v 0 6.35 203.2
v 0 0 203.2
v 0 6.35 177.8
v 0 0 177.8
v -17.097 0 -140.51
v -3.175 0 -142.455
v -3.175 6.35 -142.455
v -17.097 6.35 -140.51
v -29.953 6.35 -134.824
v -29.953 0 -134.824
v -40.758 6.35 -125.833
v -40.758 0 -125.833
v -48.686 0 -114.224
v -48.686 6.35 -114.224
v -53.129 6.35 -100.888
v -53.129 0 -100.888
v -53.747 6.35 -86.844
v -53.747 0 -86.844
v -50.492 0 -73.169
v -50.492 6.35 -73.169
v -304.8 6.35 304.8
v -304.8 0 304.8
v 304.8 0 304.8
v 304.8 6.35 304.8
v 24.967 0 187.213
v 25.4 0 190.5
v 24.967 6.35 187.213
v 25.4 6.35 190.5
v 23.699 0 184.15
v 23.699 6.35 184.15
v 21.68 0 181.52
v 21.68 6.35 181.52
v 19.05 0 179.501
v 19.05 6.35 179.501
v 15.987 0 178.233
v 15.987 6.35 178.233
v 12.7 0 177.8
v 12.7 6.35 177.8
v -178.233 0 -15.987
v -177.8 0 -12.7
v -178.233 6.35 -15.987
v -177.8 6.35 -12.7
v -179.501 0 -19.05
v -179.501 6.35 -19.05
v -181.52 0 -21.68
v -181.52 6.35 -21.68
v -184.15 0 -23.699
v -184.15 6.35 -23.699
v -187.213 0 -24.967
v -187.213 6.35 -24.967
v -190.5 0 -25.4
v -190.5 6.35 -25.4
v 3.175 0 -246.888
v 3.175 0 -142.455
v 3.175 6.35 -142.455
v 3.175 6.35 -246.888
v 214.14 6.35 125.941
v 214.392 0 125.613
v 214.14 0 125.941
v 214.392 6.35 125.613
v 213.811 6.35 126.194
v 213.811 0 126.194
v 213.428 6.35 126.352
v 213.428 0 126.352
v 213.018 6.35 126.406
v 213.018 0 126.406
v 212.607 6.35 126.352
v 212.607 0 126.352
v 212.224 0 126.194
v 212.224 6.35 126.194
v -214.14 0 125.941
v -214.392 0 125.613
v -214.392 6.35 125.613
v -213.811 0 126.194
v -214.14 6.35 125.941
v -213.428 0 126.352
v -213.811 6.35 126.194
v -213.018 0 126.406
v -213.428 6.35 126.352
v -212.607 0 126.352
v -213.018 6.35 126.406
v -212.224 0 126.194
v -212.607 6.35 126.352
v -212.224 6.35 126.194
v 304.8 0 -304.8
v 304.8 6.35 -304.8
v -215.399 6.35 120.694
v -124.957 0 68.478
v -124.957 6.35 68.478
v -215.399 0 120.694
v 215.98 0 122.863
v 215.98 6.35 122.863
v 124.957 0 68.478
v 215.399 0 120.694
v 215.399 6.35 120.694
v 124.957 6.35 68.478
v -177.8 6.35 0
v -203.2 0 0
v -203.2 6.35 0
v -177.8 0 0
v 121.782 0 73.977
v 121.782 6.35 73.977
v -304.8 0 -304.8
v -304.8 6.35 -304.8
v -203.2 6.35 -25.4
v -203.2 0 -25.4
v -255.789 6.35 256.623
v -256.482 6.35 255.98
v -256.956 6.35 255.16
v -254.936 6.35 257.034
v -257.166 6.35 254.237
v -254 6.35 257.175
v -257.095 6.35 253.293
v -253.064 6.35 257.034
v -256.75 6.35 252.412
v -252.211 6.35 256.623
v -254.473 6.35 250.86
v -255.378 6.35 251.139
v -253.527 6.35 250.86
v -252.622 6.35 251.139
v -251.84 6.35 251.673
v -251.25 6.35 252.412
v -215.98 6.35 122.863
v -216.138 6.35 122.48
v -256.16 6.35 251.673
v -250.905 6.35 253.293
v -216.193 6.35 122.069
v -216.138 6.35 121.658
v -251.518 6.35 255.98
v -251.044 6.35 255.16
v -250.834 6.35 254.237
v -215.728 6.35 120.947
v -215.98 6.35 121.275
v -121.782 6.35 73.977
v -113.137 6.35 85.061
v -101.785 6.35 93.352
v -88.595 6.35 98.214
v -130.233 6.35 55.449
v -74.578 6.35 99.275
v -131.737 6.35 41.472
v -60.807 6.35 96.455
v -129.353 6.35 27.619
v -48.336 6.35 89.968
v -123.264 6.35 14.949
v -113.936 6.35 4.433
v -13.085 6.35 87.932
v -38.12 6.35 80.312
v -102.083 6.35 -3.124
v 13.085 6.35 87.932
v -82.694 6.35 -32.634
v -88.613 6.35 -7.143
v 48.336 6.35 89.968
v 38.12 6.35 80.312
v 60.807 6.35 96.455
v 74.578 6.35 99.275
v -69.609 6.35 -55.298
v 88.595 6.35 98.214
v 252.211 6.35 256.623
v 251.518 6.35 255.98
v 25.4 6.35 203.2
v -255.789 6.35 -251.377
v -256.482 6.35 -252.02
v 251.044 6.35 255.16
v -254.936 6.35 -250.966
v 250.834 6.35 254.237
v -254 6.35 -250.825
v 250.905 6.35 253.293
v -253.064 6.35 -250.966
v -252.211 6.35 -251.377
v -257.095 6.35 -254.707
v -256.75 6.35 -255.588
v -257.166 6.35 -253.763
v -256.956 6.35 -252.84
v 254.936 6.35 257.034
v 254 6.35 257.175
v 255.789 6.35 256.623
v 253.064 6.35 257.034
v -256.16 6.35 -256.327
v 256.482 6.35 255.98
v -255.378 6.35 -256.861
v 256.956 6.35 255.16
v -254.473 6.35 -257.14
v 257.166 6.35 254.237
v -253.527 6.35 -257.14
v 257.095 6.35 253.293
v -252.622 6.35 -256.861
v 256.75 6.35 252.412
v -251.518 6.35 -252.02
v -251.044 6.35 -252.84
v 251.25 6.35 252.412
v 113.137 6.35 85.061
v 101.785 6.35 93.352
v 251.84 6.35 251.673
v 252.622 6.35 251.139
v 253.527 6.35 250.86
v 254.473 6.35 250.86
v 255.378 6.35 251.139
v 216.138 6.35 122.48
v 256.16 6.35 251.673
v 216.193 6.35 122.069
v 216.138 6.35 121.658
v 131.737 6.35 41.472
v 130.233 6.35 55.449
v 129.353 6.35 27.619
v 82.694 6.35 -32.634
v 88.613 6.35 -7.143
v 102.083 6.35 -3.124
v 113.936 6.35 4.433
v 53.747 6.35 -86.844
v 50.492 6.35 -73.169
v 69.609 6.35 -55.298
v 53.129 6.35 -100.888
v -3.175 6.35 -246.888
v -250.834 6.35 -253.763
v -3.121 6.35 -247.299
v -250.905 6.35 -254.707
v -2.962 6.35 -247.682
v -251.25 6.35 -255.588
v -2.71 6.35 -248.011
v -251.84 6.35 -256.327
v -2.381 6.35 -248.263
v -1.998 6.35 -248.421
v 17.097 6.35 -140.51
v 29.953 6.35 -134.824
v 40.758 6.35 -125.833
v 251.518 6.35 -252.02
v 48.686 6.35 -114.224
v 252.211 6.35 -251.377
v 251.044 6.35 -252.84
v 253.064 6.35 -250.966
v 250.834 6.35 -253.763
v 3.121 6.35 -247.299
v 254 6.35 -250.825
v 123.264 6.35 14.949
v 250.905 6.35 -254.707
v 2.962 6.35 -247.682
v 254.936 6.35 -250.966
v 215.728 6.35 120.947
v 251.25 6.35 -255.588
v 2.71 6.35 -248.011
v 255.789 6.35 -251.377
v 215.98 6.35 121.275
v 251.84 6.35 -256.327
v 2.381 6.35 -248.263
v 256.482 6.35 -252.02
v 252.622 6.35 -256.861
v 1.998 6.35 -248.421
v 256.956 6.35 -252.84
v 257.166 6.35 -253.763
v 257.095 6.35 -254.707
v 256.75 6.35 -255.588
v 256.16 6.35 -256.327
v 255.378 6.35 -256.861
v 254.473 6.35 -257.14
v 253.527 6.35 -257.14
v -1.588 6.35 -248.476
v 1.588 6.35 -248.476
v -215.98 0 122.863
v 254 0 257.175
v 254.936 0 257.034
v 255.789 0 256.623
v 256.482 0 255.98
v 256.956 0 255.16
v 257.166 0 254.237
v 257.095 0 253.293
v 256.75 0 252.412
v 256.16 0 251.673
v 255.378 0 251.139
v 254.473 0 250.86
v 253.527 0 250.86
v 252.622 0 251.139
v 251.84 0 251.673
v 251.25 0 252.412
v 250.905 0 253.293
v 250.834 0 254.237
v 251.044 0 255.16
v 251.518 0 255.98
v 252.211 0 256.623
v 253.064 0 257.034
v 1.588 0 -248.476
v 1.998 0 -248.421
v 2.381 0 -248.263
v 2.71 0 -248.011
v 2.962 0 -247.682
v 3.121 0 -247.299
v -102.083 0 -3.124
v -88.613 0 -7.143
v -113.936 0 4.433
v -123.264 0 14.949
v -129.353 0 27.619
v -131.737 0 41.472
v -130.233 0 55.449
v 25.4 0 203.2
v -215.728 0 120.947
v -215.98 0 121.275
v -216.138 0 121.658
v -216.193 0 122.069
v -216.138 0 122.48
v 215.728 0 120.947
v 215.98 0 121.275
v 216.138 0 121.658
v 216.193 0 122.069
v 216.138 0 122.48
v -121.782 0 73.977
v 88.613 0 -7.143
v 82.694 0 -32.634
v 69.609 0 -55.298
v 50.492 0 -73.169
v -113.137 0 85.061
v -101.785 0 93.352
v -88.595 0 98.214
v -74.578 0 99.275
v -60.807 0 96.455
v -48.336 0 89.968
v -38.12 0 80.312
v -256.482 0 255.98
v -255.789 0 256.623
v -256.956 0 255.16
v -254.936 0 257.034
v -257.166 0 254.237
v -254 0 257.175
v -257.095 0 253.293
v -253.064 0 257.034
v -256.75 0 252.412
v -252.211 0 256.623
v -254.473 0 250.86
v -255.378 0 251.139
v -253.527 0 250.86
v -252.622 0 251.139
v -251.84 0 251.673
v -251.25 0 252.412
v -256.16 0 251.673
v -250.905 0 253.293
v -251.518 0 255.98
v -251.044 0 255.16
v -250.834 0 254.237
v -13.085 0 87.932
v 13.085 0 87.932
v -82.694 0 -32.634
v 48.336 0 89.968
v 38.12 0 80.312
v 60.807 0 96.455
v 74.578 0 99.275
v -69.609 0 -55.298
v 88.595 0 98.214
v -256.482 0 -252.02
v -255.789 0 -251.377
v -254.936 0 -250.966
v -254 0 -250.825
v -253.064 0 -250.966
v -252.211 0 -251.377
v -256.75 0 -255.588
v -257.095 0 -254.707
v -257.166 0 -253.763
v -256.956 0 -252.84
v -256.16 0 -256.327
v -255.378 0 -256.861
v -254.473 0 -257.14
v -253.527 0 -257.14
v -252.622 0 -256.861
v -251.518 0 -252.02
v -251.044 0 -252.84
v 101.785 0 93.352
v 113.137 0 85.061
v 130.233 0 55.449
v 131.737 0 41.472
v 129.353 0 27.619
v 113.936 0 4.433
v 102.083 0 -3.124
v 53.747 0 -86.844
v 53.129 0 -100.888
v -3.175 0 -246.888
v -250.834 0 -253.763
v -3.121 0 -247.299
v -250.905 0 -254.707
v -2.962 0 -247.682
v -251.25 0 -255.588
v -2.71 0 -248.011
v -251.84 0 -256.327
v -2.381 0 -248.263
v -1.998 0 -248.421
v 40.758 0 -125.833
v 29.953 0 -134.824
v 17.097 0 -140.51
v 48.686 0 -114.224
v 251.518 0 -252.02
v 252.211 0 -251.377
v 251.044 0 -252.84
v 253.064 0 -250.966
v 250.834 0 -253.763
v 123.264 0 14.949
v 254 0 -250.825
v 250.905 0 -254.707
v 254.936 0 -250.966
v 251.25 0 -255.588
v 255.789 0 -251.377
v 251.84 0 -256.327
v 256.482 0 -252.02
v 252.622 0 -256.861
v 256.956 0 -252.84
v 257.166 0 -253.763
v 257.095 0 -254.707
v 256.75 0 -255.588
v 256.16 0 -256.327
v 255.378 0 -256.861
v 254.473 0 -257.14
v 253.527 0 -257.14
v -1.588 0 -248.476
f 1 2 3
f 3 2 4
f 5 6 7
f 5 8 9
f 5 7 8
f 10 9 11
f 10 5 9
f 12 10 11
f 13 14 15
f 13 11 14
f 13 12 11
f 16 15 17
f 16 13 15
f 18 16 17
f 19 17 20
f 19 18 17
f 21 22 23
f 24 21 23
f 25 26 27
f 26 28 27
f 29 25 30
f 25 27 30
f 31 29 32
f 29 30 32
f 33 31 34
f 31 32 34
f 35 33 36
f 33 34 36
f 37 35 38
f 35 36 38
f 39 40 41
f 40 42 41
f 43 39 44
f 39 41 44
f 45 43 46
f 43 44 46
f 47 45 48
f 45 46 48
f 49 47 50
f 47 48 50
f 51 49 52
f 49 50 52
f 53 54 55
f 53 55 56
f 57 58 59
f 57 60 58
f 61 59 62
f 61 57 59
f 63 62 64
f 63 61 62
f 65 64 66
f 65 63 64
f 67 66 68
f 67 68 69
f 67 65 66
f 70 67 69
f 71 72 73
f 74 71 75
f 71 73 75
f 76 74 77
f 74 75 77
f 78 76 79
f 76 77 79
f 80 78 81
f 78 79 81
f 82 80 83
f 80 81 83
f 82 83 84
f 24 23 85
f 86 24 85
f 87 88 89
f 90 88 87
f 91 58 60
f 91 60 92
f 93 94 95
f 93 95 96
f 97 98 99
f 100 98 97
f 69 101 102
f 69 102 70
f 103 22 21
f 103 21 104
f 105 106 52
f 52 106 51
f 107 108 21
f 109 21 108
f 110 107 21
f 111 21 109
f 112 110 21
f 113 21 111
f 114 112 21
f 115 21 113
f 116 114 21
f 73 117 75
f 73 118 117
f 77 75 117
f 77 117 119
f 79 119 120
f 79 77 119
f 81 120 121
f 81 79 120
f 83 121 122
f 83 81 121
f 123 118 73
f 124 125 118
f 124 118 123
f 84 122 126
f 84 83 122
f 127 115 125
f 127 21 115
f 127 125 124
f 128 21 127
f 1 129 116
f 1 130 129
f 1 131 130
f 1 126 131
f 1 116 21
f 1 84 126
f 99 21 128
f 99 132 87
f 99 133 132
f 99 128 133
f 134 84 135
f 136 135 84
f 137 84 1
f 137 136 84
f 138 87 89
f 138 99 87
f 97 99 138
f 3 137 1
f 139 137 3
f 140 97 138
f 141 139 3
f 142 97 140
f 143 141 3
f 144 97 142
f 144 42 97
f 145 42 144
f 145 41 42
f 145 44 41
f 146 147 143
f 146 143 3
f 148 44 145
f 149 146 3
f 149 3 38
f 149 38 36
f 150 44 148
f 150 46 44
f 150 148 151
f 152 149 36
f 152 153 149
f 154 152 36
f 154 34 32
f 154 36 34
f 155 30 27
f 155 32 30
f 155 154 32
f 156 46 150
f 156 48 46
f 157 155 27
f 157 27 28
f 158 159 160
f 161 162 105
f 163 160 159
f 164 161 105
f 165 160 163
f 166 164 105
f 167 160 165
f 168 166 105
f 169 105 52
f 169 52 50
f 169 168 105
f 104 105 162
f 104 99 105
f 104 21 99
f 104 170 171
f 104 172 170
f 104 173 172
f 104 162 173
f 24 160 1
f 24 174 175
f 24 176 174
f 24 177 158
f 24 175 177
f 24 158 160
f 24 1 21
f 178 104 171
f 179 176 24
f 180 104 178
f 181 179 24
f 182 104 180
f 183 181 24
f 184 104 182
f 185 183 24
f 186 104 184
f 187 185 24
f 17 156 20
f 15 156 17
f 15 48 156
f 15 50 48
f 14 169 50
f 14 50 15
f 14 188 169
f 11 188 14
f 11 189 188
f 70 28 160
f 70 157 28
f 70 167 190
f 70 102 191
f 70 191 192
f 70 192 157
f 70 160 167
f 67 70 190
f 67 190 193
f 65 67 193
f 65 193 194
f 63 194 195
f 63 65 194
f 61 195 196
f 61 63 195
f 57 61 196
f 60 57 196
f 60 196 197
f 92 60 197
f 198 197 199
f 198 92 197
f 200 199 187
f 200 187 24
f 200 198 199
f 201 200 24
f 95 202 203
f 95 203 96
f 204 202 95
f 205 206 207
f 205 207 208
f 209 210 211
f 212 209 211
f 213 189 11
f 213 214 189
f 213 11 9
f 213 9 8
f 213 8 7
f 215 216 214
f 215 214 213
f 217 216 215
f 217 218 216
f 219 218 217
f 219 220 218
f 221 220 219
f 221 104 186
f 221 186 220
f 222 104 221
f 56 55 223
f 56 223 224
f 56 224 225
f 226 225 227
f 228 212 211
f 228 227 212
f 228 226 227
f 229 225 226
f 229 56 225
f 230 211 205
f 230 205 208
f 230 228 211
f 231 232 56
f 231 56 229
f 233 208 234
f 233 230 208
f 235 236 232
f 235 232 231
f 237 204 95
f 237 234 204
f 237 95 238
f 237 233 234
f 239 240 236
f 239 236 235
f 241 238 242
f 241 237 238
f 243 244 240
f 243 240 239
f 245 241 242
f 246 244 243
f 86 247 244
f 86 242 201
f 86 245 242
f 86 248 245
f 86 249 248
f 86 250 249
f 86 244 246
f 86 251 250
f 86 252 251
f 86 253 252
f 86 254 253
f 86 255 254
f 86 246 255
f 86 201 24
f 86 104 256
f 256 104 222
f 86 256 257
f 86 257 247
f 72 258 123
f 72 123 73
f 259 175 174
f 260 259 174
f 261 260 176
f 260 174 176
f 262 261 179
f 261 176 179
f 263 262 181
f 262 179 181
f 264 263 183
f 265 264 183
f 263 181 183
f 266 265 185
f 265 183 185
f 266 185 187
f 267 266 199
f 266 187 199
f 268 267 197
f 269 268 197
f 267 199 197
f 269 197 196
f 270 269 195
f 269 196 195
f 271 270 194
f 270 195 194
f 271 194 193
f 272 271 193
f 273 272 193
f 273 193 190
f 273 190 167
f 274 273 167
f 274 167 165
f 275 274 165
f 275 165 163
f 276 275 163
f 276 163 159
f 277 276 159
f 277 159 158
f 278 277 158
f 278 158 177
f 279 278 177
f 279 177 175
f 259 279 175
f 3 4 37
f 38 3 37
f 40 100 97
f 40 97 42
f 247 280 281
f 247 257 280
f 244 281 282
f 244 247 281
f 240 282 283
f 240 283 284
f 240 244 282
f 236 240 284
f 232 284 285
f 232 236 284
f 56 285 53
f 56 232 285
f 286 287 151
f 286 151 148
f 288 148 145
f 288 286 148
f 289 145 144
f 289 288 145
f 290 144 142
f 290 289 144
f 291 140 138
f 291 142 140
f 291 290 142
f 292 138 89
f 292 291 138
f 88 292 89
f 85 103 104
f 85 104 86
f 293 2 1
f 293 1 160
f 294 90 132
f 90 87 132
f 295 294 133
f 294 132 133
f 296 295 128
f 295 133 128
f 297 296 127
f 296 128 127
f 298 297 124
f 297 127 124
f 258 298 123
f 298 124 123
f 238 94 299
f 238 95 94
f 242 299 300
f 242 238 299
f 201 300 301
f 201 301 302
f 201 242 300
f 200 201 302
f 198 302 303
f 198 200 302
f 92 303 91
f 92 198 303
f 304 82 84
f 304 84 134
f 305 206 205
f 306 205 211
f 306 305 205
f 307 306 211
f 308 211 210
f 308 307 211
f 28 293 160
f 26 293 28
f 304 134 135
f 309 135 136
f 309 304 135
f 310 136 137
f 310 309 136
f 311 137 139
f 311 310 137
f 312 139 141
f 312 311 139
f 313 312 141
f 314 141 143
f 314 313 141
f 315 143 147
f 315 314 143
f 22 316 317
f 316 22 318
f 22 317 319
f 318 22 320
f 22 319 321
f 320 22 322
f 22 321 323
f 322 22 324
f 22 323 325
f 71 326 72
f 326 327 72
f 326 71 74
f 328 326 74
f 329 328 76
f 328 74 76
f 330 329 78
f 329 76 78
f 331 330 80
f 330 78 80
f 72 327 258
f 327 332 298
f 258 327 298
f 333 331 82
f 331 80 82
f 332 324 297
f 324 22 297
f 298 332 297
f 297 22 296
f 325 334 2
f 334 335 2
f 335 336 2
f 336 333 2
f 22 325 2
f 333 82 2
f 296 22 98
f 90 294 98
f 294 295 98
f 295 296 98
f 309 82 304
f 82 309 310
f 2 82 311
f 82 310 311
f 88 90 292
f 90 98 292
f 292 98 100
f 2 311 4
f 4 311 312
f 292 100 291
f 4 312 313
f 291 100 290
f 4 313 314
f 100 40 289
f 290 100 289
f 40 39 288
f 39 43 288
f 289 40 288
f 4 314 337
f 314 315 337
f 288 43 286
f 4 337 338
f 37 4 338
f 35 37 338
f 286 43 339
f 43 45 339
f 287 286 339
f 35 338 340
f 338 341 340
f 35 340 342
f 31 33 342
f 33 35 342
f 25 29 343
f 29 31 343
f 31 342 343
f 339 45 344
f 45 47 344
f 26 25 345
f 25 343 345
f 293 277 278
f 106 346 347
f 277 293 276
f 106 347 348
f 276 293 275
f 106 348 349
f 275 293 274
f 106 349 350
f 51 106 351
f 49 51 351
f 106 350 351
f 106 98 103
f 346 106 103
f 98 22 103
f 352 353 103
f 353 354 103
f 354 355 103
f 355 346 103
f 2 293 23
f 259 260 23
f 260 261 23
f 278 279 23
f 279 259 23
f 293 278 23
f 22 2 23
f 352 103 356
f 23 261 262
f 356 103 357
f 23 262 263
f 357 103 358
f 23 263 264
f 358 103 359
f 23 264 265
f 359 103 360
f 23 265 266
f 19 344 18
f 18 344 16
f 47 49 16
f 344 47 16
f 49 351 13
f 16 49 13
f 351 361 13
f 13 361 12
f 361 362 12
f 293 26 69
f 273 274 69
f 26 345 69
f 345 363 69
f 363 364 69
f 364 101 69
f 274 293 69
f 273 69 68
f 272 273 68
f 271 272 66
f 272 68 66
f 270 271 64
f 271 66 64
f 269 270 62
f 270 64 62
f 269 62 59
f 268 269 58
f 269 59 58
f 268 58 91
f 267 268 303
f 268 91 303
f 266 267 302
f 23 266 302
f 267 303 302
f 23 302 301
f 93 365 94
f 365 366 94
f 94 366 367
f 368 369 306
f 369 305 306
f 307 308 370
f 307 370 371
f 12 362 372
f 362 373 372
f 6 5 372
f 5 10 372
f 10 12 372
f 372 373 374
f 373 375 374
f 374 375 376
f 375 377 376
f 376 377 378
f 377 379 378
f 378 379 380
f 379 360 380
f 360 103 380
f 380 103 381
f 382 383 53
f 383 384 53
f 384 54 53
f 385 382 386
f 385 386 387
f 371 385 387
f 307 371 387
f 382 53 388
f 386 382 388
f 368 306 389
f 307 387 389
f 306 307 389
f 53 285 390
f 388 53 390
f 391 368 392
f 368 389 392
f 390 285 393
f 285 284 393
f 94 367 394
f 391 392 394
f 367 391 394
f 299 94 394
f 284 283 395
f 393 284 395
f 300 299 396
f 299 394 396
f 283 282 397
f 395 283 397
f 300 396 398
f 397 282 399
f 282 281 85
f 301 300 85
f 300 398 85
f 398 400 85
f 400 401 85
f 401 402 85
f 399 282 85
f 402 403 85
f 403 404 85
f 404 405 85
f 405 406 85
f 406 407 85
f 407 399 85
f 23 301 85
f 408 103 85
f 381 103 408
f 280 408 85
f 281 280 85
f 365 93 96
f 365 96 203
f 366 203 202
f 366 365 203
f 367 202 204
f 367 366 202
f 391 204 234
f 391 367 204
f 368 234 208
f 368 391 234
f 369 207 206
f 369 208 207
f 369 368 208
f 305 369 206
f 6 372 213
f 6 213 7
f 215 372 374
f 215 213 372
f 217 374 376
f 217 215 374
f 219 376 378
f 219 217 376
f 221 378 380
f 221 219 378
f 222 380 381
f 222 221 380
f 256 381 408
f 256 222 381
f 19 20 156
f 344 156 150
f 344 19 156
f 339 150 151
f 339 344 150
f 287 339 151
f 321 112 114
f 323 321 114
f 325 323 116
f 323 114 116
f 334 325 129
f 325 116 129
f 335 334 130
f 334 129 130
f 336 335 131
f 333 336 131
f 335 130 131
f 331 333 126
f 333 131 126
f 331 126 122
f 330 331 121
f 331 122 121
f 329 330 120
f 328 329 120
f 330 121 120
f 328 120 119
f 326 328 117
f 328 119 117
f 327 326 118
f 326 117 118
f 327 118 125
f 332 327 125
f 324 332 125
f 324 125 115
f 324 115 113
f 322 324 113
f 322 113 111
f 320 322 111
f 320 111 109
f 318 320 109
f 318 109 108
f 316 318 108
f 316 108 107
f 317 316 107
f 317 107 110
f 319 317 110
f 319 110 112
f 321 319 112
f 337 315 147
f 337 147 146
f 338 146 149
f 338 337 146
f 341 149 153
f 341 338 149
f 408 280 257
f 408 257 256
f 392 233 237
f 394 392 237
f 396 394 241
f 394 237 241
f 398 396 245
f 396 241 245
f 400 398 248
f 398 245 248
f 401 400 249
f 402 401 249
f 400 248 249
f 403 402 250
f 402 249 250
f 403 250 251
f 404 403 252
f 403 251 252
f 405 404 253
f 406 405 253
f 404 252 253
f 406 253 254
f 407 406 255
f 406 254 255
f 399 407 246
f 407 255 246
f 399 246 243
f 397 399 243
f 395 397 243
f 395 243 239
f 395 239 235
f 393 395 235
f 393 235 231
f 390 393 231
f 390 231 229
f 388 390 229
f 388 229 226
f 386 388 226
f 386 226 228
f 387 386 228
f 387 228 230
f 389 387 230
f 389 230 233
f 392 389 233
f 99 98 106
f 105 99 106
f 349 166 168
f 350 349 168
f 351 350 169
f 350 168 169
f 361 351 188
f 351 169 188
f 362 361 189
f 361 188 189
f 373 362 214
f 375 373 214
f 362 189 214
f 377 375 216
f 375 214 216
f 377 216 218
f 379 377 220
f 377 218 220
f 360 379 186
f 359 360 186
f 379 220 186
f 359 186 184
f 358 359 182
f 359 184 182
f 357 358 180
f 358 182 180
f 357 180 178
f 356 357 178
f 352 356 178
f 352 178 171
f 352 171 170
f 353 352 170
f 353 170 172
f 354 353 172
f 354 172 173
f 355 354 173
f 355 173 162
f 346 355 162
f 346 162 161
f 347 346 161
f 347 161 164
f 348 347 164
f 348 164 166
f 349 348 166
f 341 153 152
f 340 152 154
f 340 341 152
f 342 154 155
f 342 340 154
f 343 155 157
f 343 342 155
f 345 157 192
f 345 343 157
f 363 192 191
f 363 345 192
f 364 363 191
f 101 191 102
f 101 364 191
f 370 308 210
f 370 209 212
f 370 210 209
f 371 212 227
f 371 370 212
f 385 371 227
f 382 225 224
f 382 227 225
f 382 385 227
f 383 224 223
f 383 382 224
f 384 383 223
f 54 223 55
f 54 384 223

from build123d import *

# Parameters (mm, degrees)
SKETCH1_W           = 609.6
SKETCH1_H           = 609.6
BOSS_EXTRUDE1_DEPTH = 6.35
CUT_EXTRUDE2_DEPTH  = 432.099063441
SKETCH4_W           = 25.4
SKETCH4_H           = 25.4
CUT_EXTRUDE8_DEPTH  = 432.099063441
FILLET4_R           = 12.7
FILLET5_R           = 12.7
SKETCH5_R           = 3.175
CUT_EXTRUDE9_DEPTH  = 432.099063441
FILLET9_R           = 1.5875


with BuildPart() as part:
    # Sketch1 → Boss-Extrude1 (new body)
    with BuildSketch(Plane(origin=(0, 0, 0), x_dir=(1, 0, 0), z_dir=(0, 1, 0))):
        Rectangle(SKETCH1_W, SKETCH1_H)
    extrude(amount=BOSS_EXTRUDE1_DEPTH)

    # Sketch3 → Cut-Extrude2 (cut, through all)
    with BuildSketch(Plane(origin=(0, 0, 0), x_dir=(1, 0, 0), z_dir=(0, 1, 0))):
        with BuildLine():
            Line((-3.175, 248.4755), (-3.175, 142.454689298))
            ThreePointArc((-3.175, 142.454689298), (-45.125573361, 120.304111538), (-50.492310608, 73.169232396))
            ThreePointArc((-50.492310608, 73.169232396), (-76.989658396, 44.45), (-88.612569335, 7.143007484))
            ThreePointArc((-88.612569335, 7.143007484), (-126.749203452, -21.072162878), (-124.95687982, -68.477713992))
            Line((-124.95687982, -68.477713992), (-216.773595218, -121.488119343))
            Line((-216.773595218, -121.488119343), (-213.598595218, -126.987380657))
            Line((-213.598595218, -126.987380657), (-121.78187982, -73.976975306))
            ThreePointArc((-121.78187982, -73.976975306), (-81.623630091, -99.23194866), (-38.120258727, -80.31223988))
            ThreePointArc((-38.120258727, -80.31223988), (0, -88.9), (38.120258727, -80.31223988))
            ThreePointArc((38.120258727, -80.31223988), (81.623630091, -99.23194866), (121.78187982, -73.976975306))
            Line((121.78187982, -73.976975306), (213.598595218, -126.987380657))
            Line((213.598595218, -126.987380657), (216.773595218, -121.488119343))
            Line((216.773595218, -121.488119343), (124.95687982, -68.477713992))
            ThreePointArc((124.95687982, -68.477713992), (126.749203452, -21.072162878), (88.612569335, 7.143007484))
            ThreePointArc((88.612569335, 7.143007484), (76.989658396, 44.45), (50.492310608, 73.169232396))
            ThreePointArc((50.492310608, 73.169232396), (45.125573361, 120.304111538), (3.175, 142.454689298))
            Line((3.175, 142.454689298), (3.175, 248.4755))
            Line((3.175, 248.4755), (-3.175, 248.4755))
        make_face()
    extrude(amount=CUT_EXTRUDE2_DEPTH, mode=Mode.SUBTRACT)

    # Sketch4 → Cut-Extrude8 (cut, through all)
    with BuildSketch(Plane(origin=(0, 0, 0), x_dir=(1, 0, 0), z_dir=(0, 1, 0))):
        with Locations((12.7, -190.5)):
            Rectangle(SKETCH4_W, SKETCH4_H)
        with Locations((-190.5, 12.7)):
            Rectangle(SKETCH4_W, SKETCH4_H)
    extrude(amount=CUT_EXTRUDE8_DEPTH, mode=Mode.SUBTRACT)

    # Fillet4
    fillet4_edges = [part.edges().sort_by_distance(p)[0] for p in [
        (-177.8, 3.175, -25.4),
    ]]
    fillet(fillet4_edges, radius=FILLET4_R)

    # Fillet5
    fillet5_edges = [part.edges().sort_by_distance(p)[0] for p in [
        (25.4, 3.175, 177.8),
    ]]
    fillet(fillet5_edges, radius=FILLET5_R)

    # Sketch5 → Cut-Extrude9 (cut, through all)
    with BuildSketch(Plane(origin=(0, 6.35, 0), x_dir=(1, 0, 0), z_dir=(0, 1, 0))):
        with Locations(Location((-254, 254, 0), (0, 0, 270))):
            Circle(SKETCH5_R)
        with Locations(Location((254, 254, 0), (0, 0, 270))):
            Circle(SKETCH5_R)
        with Locations(Location((254, -254, 0), (0, 0, 270))):
            Circle(SKETCH5_R)
        with Locations(Location((-254, -254, 0), (0, 0, 270))):
            Circle(SKETCH5_R)
    extrude(amount=-CUT_EXTRUDE9_DEPTH, mode=Mode.SUBTRACT)

    # Fillet9
    fillet9_edges = [part.edges().sort_by_distance(p)[0] for p in [
        (3.175, 3.175, -248.4755),
        (-3.175, 3.175, -248.4755),
        (-216.773595218, 3.175, 121.488119343),
        (-213.598595218, 3.175, 126.987380657),
        (213.598595218, 3.175, 126.987380657),
        (216.773595218, 3.175, 121.488119343),
    ]]
    fillet(fillet9_edges, radius=FILLET9_R)


solid = part.part
